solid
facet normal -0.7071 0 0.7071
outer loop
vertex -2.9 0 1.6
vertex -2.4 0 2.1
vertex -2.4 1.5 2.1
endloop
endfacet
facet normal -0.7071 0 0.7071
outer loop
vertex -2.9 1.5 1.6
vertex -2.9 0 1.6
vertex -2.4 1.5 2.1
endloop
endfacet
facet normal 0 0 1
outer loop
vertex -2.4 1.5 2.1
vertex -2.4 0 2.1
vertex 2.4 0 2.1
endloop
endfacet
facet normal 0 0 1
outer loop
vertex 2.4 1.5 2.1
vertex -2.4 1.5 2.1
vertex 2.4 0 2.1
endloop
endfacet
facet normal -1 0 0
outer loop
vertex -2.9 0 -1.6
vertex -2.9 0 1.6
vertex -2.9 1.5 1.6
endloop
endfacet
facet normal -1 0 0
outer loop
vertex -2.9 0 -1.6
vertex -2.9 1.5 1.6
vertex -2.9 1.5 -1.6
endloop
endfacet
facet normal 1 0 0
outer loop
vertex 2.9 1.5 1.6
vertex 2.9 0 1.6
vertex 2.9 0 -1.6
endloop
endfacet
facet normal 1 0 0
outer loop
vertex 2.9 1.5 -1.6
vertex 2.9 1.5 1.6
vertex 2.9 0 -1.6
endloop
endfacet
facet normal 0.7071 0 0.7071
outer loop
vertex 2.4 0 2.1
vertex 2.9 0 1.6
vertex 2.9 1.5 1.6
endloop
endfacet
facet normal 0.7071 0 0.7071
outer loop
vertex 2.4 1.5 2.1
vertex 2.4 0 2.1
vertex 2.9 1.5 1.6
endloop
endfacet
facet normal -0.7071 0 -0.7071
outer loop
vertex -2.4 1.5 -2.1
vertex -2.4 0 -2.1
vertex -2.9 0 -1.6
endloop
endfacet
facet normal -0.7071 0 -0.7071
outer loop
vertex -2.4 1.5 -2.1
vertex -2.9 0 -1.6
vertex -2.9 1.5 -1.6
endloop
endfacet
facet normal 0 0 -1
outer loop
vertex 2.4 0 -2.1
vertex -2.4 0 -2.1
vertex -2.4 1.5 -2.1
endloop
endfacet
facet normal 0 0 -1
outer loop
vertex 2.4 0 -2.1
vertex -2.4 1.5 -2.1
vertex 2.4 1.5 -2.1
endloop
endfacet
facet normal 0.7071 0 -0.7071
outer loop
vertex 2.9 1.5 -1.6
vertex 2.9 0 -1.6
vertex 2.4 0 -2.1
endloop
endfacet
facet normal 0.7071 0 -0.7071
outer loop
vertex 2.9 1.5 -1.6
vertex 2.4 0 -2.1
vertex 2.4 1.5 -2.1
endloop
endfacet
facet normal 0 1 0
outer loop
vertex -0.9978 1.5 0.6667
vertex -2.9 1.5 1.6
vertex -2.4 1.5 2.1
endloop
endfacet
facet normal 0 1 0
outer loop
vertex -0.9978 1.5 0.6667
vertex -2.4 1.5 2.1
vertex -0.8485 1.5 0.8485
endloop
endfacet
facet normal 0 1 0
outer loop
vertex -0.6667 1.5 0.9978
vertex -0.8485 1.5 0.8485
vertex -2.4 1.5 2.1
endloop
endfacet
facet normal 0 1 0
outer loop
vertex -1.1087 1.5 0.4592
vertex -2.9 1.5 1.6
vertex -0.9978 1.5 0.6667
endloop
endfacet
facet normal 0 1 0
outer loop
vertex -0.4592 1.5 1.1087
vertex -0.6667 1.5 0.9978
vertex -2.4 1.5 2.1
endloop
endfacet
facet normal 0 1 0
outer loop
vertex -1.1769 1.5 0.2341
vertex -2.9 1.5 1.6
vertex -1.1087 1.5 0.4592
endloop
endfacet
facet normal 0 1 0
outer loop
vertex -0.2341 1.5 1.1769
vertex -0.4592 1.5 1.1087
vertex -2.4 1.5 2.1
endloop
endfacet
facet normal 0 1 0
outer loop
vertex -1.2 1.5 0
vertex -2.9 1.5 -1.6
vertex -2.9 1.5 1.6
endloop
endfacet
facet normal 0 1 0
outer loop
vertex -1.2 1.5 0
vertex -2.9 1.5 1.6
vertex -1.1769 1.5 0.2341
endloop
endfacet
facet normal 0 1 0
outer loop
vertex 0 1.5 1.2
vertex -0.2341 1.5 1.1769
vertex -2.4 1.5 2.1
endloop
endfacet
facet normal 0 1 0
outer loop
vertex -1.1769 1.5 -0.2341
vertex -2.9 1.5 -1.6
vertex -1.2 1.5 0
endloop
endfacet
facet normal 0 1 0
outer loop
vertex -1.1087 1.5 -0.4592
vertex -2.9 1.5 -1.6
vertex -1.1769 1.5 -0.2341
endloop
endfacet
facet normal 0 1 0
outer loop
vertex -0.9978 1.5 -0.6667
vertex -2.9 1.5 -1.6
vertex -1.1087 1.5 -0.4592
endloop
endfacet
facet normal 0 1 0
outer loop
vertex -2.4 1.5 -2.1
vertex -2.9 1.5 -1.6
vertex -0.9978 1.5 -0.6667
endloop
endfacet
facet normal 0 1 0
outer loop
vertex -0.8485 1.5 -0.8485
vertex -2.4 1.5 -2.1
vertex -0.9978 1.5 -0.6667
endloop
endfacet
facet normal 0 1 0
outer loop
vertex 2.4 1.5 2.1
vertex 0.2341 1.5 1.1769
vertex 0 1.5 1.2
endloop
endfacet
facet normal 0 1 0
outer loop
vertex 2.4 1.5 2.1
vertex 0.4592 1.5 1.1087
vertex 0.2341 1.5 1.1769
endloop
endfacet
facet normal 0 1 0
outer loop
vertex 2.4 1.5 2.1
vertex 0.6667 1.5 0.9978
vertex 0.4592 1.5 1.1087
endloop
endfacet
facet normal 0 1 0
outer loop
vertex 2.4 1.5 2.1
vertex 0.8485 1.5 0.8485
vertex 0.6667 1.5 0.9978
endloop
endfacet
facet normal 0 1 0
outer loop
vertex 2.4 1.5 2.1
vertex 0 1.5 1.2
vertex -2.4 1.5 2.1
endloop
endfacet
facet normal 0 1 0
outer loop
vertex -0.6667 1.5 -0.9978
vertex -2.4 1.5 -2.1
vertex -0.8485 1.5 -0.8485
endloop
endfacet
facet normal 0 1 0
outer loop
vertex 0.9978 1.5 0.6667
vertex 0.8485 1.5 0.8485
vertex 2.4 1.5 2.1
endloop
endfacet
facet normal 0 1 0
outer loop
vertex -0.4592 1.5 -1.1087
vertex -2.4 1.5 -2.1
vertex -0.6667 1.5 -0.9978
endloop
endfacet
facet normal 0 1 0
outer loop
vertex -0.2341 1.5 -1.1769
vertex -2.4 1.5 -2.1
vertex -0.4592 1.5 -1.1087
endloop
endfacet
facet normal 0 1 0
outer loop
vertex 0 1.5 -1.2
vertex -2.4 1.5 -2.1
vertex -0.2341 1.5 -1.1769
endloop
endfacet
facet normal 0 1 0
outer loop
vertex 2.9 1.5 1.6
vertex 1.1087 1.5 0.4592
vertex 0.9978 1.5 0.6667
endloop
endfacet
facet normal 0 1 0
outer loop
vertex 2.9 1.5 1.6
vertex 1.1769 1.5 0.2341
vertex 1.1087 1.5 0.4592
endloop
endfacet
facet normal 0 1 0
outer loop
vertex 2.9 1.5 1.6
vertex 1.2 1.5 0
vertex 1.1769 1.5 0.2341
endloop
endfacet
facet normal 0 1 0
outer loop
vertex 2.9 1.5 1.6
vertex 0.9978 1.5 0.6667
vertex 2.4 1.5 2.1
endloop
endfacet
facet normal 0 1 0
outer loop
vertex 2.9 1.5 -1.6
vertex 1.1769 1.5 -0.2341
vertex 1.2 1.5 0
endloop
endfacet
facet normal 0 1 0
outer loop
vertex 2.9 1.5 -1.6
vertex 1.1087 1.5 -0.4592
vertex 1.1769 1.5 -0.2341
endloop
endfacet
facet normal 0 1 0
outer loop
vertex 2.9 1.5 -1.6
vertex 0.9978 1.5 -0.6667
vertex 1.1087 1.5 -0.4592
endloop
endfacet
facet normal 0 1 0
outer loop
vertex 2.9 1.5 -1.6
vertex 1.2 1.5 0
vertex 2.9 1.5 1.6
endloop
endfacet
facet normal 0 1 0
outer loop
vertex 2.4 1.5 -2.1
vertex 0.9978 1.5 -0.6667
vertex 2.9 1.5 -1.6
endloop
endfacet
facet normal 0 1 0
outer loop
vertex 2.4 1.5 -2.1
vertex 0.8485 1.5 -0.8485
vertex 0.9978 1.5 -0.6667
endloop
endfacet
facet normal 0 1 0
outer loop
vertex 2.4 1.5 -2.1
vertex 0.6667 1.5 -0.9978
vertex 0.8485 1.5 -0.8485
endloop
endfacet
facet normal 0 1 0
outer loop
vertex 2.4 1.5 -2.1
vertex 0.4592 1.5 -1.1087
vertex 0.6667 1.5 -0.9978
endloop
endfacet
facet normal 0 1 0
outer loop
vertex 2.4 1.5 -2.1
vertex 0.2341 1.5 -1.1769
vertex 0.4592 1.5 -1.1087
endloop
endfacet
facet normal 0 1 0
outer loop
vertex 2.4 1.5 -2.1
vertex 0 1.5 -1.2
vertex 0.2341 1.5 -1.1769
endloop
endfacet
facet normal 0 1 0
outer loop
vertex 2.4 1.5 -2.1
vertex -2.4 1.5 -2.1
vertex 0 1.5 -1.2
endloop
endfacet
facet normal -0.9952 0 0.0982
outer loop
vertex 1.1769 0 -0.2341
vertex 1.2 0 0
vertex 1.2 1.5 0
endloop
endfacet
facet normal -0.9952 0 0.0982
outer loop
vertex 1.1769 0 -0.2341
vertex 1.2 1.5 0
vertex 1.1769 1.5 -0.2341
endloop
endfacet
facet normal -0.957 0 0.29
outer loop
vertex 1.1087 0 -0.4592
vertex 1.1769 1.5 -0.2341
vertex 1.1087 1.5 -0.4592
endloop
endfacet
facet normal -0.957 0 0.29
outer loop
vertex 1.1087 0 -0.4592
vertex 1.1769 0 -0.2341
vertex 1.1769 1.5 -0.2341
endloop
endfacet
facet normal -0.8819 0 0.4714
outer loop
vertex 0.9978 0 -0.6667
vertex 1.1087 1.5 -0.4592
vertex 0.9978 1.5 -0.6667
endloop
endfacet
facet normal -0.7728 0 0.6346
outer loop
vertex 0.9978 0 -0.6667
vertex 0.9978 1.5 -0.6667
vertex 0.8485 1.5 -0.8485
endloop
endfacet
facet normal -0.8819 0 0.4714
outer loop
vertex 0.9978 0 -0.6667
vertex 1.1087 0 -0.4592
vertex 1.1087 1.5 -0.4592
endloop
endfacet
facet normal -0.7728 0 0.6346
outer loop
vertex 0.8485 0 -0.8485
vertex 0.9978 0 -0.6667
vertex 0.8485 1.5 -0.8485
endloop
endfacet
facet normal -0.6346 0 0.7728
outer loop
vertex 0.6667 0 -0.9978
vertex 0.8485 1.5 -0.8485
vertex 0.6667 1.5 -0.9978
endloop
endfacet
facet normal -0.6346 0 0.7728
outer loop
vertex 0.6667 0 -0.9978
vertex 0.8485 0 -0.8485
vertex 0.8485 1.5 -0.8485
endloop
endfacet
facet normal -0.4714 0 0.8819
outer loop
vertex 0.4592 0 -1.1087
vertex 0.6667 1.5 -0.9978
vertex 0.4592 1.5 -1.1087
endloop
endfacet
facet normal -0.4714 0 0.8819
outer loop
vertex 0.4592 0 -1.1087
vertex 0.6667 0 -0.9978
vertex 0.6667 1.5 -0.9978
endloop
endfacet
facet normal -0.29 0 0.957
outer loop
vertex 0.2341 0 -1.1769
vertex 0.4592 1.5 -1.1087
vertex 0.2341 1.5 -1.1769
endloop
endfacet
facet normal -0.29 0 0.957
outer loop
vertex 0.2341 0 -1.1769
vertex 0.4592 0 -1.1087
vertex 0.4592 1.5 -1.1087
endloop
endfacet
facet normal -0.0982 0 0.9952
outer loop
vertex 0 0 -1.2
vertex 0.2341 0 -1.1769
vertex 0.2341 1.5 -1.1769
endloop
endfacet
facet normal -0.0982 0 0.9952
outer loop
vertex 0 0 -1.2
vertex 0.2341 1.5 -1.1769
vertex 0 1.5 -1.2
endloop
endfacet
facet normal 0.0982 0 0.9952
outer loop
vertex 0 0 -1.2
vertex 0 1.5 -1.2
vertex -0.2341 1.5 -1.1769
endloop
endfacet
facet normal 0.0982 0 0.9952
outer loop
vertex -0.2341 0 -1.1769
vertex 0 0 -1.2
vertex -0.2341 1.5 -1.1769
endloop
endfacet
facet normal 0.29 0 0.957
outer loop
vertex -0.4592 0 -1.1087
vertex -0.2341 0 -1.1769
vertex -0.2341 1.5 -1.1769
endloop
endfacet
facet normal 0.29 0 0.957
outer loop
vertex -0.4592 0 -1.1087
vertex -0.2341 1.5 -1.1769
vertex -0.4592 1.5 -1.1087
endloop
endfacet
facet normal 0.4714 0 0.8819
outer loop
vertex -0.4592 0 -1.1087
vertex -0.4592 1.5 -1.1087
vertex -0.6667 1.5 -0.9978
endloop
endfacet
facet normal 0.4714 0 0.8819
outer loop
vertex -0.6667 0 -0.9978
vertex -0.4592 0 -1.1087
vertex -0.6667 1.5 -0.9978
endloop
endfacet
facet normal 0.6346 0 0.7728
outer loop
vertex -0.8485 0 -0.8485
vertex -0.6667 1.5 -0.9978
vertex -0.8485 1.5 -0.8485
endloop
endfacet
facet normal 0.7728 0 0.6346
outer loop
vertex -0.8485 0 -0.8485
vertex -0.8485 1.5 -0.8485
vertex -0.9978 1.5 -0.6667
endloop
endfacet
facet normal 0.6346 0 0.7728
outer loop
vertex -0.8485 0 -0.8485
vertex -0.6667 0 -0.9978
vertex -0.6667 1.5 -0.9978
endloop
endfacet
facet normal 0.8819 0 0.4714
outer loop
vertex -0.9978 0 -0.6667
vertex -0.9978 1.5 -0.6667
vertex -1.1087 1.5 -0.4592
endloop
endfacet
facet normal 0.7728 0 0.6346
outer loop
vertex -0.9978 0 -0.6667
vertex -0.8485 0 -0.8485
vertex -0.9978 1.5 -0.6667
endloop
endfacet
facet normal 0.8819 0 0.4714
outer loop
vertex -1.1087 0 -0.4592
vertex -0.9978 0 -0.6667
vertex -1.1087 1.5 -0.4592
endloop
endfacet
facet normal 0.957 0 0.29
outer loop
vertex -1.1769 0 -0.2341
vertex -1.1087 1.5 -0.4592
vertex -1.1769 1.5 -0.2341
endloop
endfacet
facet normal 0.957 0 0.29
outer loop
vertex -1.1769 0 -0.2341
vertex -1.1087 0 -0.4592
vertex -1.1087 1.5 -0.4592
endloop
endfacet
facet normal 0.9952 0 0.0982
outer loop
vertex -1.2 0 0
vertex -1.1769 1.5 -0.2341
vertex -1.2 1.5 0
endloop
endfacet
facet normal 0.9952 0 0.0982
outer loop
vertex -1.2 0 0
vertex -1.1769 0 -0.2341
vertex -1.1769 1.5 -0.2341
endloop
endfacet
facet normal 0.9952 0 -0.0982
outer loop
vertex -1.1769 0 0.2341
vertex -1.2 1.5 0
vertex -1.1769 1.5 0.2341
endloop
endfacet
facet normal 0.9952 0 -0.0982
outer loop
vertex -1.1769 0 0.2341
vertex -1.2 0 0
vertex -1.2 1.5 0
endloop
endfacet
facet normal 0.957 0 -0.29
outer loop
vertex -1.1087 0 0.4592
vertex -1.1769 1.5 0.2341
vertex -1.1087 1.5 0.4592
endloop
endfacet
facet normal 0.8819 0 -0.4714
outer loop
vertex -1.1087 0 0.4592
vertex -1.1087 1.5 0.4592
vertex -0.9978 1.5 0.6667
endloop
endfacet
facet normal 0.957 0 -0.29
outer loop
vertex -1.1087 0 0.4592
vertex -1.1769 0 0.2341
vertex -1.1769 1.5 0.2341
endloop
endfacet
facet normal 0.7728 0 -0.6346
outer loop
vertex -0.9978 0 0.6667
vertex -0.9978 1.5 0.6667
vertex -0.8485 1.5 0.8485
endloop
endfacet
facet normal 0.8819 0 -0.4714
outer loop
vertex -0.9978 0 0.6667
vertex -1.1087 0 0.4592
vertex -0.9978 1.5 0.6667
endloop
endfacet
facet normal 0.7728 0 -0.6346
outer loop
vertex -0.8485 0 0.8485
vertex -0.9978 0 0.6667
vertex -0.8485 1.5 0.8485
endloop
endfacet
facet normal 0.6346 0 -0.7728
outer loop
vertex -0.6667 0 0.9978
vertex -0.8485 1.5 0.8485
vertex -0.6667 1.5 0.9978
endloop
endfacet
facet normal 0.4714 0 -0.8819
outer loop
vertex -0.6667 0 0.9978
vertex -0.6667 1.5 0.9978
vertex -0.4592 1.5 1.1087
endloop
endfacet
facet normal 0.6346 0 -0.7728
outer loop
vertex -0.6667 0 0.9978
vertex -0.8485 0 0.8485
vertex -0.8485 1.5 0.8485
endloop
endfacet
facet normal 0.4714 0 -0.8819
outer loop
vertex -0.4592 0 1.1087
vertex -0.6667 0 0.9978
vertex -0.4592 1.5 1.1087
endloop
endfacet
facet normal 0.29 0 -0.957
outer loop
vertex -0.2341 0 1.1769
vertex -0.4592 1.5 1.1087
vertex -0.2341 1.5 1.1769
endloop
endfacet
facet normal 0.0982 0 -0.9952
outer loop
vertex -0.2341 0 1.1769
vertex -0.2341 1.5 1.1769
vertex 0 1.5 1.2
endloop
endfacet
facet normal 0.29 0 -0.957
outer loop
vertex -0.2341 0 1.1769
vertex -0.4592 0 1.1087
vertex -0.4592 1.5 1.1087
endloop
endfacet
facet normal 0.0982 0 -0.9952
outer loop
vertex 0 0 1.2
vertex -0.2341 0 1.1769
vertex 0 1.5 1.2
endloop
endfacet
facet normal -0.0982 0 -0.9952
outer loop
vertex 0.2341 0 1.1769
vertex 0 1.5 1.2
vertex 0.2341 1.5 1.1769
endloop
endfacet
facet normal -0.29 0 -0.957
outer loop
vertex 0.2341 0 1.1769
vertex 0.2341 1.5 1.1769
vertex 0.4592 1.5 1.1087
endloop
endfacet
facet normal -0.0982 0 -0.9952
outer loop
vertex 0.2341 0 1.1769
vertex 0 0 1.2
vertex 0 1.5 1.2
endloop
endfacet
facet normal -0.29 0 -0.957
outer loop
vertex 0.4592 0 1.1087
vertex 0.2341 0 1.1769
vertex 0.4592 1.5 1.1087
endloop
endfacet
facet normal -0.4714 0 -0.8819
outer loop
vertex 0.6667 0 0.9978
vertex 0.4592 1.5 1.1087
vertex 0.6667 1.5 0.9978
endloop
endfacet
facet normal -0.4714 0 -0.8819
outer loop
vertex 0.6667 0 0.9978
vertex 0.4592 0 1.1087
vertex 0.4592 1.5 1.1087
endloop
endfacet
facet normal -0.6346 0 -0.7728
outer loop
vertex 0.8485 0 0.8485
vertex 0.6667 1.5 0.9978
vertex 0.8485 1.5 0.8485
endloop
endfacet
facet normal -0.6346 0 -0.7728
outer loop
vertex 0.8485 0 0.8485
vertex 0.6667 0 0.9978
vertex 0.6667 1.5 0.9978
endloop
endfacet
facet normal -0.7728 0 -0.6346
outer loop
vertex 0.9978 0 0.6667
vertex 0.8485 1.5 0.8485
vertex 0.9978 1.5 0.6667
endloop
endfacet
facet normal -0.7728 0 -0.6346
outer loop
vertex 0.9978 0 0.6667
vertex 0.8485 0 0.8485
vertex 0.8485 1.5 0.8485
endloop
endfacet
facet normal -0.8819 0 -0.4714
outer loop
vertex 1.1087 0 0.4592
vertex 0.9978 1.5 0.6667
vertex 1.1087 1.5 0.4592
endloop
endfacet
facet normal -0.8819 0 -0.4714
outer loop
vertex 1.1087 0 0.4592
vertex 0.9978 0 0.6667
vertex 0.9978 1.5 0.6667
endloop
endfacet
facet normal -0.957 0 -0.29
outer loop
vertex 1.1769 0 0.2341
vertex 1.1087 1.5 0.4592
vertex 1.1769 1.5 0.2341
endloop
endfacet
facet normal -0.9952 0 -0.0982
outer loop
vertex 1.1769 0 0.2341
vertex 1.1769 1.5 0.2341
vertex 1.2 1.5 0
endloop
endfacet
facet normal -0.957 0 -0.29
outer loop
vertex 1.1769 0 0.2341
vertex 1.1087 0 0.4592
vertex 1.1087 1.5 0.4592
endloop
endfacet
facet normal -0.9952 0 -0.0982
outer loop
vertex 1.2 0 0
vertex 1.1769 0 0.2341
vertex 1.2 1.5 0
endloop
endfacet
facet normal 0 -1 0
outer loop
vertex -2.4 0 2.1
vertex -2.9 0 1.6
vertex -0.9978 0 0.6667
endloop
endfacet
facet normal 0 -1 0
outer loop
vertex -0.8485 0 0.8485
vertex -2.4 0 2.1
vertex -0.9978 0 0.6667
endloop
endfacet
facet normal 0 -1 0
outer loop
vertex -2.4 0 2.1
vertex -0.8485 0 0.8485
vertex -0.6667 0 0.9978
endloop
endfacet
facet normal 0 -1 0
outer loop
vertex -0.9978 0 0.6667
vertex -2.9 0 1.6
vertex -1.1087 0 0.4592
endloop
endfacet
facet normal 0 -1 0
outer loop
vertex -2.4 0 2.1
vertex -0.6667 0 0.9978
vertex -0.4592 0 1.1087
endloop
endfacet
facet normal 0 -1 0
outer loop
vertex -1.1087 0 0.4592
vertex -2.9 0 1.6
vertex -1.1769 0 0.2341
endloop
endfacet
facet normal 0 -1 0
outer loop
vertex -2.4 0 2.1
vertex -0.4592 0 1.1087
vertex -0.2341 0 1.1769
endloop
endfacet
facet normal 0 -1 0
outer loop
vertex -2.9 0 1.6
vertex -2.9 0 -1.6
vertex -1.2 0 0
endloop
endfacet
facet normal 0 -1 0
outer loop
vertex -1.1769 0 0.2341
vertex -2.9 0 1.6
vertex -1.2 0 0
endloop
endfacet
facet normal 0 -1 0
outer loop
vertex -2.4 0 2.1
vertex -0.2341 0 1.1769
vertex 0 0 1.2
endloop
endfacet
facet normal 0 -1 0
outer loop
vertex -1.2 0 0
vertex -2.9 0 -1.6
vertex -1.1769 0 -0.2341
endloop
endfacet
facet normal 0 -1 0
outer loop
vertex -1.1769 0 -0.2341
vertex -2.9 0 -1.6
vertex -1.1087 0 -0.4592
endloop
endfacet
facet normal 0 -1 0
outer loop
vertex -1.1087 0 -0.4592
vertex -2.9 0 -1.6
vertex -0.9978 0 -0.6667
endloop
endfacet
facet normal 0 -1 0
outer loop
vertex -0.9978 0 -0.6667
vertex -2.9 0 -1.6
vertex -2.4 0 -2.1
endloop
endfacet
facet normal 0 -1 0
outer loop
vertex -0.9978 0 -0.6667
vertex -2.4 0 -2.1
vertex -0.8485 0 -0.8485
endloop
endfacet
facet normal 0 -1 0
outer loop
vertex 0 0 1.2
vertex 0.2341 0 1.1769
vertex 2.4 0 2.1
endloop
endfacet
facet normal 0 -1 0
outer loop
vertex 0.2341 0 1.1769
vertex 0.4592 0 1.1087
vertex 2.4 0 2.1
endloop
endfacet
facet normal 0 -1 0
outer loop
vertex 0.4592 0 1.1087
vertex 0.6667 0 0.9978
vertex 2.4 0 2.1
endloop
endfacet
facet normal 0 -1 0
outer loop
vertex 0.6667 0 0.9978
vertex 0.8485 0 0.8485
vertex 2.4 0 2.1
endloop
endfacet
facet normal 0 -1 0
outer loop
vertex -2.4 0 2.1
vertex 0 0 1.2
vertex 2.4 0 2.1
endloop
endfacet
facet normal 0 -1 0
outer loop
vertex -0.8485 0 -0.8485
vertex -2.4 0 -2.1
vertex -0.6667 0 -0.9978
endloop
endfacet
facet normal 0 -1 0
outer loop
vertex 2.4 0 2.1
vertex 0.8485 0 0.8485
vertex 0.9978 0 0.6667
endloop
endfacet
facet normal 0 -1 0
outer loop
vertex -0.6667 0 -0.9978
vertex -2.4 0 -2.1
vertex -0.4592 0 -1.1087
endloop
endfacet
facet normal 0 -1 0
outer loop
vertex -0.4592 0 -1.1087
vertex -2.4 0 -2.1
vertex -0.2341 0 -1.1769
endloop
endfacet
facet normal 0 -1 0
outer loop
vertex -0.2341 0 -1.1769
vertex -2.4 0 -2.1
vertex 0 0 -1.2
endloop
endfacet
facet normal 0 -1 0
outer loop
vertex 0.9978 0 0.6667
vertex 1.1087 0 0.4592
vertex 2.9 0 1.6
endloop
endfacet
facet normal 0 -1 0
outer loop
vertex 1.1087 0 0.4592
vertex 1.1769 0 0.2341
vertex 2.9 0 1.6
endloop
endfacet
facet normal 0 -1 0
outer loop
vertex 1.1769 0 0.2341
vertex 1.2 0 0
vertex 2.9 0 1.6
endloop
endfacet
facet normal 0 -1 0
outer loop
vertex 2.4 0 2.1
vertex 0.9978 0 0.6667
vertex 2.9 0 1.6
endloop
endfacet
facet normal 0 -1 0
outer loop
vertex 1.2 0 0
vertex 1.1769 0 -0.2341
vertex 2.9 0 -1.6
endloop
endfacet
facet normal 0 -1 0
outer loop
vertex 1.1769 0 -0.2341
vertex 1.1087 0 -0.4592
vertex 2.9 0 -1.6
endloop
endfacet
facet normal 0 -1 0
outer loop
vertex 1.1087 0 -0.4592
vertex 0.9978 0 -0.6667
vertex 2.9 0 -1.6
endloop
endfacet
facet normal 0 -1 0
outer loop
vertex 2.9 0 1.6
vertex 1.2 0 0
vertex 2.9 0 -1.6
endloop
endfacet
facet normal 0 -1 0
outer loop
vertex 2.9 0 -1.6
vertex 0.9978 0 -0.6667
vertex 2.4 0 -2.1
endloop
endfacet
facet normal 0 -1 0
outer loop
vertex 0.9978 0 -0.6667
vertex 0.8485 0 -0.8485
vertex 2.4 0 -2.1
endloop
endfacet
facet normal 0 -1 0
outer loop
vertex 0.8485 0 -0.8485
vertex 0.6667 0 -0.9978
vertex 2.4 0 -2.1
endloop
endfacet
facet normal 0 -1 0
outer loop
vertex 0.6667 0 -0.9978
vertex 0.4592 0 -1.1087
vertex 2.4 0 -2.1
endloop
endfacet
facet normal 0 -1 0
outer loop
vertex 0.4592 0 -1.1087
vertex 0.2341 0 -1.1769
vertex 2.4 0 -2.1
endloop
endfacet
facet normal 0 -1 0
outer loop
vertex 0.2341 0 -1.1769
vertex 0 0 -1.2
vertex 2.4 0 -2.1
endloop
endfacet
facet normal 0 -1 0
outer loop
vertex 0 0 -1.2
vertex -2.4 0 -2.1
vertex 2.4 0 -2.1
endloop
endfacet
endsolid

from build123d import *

# Parameters (mm, degrees)
SKETCH1_W           = 5.8
SKETCH1_H           = 4.2
SKETCH1_R           = 1.2
BOSS_EXTRUDE1_DEPTH = 1.5
CHAMFER1_SIZE       = 0.5


with BuildPart() as part:
    # Sketch1 → Boss-Extrude1 (new body)
    with BuildSketch(Plane(origin=(0, 0, 0), x_dir=(1, 0, 0), z_dir=(0, 1, 0))):
        Rectangle(SKETCH1_W, SKETCH1_H)
        Circle(SKETCH1_R, mode=Mode.SUBTRACT)
    extrude(amount=BOSS_EXTRUDE1_DEPTH)

    # Chamfer1
    chamfer1_edges = [part.edges().sort_by_distance(p)[0] for p in [
        (2.9, 0.75, 2.1),
        (-2.9, 0.75, 2.1),
        (-2.9, 0.75, -2.1),
        (2.9, 0.75, -2.1),
    ]]
    chamfer(chamfer1_edges, length=CHAMFER1_SIZE)


solid = part.part
